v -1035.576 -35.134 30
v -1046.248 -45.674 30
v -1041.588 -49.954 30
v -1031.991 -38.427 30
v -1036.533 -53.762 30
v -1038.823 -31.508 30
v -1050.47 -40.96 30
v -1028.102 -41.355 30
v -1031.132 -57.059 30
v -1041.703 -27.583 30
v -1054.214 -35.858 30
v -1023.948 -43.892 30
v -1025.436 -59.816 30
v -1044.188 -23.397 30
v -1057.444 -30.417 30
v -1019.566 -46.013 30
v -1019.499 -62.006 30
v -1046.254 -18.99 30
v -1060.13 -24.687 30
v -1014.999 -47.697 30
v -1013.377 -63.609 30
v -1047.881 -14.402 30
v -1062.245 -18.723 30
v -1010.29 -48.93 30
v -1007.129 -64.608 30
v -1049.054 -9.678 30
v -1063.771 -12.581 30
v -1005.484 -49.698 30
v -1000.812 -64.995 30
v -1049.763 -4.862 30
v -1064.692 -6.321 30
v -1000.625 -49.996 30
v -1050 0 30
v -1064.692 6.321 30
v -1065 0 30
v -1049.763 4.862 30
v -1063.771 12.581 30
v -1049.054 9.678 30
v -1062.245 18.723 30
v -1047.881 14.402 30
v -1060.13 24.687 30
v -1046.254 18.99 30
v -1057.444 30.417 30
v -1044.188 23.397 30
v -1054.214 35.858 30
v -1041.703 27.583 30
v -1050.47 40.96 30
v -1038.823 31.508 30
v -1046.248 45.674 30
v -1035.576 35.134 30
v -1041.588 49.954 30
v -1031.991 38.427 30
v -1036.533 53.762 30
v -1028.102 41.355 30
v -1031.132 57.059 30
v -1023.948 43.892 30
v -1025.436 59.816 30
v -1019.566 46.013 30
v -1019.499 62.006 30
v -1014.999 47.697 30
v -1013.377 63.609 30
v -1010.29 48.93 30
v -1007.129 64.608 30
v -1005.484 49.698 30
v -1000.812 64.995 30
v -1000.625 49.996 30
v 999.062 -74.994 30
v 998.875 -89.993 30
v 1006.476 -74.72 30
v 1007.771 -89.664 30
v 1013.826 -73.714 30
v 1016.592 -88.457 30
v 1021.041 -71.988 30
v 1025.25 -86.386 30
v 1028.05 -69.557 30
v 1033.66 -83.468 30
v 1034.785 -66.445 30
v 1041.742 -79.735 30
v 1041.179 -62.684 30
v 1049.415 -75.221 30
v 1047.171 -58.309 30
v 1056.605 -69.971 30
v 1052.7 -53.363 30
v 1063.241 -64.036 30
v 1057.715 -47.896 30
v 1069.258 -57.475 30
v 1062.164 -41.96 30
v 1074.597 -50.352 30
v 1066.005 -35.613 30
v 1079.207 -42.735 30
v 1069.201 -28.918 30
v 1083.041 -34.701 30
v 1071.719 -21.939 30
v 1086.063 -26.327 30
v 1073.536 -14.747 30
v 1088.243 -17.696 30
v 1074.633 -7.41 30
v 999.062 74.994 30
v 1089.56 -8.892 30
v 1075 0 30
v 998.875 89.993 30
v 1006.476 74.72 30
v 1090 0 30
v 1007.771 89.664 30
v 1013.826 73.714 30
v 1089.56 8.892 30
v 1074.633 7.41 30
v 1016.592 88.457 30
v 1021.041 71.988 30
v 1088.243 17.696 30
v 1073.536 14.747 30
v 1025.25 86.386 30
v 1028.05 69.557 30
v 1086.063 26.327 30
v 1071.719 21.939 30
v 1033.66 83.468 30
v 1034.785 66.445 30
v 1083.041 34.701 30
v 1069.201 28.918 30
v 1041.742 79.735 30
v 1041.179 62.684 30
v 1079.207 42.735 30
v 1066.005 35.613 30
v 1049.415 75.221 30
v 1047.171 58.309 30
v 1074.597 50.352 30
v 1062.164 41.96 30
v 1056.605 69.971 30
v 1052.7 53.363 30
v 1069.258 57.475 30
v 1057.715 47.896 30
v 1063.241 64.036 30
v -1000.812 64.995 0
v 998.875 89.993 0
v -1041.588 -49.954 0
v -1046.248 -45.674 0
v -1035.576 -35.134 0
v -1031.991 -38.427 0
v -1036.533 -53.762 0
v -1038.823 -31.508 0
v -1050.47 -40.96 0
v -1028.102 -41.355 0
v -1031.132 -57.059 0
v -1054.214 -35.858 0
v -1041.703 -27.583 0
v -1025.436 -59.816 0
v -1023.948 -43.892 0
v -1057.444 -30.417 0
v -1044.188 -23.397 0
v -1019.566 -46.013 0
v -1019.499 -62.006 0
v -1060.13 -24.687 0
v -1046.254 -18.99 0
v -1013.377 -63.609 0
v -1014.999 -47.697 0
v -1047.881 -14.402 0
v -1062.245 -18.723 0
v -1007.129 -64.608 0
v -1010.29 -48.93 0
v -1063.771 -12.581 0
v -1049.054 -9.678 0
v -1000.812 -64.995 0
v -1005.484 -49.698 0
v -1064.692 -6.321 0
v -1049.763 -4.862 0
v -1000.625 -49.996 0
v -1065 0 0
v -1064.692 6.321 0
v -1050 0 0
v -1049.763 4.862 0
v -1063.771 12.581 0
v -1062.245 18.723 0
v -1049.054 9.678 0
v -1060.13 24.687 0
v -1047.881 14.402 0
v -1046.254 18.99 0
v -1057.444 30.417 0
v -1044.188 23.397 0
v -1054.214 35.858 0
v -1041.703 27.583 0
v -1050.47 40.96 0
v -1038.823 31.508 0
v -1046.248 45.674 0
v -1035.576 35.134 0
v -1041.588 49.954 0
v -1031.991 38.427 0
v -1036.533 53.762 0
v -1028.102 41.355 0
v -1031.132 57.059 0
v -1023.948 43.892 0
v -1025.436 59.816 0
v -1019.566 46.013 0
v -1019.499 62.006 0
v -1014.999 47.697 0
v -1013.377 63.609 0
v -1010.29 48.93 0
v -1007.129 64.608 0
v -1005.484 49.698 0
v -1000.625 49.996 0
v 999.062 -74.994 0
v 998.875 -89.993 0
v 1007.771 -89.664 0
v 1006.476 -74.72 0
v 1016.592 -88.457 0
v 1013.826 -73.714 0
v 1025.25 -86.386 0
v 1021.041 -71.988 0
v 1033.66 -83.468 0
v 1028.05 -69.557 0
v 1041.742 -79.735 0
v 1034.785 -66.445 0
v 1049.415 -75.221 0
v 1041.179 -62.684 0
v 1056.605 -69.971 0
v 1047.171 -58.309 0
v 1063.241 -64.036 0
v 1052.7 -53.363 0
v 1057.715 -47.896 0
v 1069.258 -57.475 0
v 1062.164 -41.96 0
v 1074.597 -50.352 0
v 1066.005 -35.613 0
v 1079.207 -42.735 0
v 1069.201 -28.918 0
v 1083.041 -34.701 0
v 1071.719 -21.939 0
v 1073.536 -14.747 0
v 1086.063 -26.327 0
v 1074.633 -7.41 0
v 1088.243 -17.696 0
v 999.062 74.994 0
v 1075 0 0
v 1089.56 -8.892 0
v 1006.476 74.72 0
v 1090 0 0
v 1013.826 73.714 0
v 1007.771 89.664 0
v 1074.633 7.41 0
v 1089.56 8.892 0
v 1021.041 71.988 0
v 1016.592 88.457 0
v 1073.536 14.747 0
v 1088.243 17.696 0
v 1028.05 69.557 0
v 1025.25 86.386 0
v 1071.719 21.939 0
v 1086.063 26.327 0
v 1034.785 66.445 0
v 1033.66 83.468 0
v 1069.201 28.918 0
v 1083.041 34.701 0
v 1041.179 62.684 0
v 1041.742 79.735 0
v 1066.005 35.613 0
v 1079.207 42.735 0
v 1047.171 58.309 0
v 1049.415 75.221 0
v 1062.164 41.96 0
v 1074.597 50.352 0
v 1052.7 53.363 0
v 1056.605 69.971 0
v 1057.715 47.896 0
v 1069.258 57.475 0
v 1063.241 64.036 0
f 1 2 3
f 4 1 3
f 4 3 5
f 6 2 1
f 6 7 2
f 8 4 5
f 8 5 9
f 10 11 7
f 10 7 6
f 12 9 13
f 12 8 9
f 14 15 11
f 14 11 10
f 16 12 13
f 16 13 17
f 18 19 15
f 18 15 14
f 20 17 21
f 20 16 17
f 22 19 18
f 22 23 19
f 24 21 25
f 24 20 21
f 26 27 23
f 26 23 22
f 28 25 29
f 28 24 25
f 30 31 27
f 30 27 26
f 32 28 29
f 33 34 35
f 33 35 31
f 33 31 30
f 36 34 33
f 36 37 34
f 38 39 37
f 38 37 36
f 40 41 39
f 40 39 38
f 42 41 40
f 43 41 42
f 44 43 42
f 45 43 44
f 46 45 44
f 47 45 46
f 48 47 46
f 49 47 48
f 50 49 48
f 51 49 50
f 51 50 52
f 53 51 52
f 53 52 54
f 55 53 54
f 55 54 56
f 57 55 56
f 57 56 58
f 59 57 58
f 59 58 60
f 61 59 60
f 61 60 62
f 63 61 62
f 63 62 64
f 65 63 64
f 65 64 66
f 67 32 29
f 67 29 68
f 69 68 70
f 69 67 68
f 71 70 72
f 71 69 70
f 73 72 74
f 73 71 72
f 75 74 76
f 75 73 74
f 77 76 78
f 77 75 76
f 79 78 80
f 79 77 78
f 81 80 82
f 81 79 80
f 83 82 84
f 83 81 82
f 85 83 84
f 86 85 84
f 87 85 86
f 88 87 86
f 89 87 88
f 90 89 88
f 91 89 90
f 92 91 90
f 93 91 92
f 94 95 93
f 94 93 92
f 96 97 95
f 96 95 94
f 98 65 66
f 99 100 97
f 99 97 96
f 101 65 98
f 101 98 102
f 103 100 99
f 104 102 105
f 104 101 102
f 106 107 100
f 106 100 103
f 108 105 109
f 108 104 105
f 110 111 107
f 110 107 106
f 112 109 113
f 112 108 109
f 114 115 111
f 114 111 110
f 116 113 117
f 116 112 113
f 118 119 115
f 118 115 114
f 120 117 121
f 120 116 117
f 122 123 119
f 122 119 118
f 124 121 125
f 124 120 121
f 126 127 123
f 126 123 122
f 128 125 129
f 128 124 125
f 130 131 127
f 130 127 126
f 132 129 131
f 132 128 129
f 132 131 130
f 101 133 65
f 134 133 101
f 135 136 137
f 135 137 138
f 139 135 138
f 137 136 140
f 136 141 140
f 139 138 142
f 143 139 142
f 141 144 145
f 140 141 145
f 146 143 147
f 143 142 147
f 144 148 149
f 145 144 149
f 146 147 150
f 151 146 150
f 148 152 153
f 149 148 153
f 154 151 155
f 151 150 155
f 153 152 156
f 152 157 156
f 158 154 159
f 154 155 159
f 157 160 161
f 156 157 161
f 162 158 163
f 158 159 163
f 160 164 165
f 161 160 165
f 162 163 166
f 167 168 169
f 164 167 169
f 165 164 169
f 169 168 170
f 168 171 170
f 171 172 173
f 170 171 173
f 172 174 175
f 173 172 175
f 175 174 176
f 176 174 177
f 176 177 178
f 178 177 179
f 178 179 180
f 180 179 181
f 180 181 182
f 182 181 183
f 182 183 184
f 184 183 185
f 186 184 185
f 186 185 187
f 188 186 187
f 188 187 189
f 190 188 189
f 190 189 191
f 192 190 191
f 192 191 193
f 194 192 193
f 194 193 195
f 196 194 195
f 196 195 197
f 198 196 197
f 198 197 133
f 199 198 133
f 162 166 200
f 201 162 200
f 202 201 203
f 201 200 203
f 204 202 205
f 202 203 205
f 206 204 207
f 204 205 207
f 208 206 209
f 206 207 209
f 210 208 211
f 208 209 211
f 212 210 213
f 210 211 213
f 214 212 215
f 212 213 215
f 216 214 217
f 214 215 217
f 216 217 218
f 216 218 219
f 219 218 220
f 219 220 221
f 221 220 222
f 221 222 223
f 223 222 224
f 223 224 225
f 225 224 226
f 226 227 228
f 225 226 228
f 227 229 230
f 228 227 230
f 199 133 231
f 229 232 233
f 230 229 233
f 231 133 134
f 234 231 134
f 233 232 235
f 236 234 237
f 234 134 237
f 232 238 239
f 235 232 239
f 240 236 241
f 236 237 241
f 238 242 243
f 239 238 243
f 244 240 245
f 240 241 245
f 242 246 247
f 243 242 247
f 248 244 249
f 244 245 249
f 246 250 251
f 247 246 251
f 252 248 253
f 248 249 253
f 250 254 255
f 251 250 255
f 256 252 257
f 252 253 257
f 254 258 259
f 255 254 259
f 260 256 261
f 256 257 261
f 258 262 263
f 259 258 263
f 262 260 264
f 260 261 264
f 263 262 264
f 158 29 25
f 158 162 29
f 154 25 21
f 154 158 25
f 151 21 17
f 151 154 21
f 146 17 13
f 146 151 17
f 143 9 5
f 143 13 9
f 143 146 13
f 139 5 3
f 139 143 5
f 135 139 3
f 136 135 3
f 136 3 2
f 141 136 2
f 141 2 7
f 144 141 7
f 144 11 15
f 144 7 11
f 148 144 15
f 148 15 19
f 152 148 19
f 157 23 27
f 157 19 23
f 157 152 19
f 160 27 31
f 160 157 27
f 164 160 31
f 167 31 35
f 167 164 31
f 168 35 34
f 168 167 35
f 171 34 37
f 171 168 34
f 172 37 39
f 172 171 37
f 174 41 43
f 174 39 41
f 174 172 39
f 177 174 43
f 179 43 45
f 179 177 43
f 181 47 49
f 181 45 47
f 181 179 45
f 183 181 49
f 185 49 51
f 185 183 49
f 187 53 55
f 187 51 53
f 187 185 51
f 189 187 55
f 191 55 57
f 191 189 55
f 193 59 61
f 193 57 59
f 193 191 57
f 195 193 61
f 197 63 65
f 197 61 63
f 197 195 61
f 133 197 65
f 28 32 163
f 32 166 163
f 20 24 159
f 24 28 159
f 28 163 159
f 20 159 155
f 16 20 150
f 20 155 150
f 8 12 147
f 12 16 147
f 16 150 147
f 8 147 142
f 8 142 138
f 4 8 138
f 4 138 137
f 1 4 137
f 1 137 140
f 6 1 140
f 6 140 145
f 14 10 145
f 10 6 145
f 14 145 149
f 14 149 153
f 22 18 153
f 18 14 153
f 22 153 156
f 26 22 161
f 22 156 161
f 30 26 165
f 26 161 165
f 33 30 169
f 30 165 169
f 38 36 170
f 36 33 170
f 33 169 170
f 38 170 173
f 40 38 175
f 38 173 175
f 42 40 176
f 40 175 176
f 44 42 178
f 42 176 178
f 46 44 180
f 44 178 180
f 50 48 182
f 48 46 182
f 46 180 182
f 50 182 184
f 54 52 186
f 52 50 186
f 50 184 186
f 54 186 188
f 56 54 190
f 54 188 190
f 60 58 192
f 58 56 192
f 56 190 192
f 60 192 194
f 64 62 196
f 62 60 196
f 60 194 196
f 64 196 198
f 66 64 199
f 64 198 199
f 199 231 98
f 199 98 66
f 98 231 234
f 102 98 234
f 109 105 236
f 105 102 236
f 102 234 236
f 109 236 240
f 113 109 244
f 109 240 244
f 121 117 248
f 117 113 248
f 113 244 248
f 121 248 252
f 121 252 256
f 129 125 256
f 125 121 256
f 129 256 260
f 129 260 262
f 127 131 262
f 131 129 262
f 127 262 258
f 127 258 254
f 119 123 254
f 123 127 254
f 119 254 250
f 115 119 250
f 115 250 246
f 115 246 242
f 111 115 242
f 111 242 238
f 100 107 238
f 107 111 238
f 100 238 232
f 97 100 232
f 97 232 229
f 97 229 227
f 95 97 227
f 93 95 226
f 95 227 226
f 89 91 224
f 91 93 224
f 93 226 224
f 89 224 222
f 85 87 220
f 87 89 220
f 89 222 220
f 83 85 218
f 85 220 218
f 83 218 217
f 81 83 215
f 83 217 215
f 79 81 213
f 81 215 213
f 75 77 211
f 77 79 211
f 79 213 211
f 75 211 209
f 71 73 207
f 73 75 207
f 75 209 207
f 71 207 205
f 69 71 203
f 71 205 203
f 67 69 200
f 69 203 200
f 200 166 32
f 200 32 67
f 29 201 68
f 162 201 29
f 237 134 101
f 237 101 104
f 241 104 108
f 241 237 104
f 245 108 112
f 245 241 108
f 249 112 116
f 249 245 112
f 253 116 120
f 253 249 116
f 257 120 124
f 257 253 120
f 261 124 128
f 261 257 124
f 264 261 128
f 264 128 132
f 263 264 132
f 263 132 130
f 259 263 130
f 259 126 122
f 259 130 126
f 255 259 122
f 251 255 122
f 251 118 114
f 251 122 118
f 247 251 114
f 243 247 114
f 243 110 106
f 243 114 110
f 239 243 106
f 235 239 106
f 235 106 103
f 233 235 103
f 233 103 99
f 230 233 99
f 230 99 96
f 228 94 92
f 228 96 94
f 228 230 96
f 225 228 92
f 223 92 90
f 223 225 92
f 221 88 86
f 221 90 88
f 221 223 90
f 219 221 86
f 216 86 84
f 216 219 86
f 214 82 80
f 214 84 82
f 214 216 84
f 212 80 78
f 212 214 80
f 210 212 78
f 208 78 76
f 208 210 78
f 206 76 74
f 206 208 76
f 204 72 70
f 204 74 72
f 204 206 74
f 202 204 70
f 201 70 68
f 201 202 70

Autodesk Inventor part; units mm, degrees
ref_plane "YZ Plane" through (0, 0, 0) normal (1, 0, 0) x (0, 1, 0)
ref_plane "XZ Plane" through (0, 0, 0) normal (0, 1, 0) x (-1, 0, 0)
ref_plane "XY Plane" through (0, 0, 0) normal (0, 0, 1) x (1, 0, 0)
sketch "Boceto1" plane through (0, 0, 0) normal (0, 0, 1) x (1, 0, 0)
  arc A0 (-1000.625, 49.9961) -> (-1000.625, -49.9961) centre (-1000, 0) ccw
  arc A1 (999.0625, -74.9941) -> (999.0625, 74.9941) centre (1000, 0) ccw
  line L0 (999.0625, 74.9941) -> (-1000.625, 49.9961)
  line L1 (-1000.625, -49.9961) -> (999.0625, -74.9941)
  line L2 (-1000.8125, 64.9949) -> (998.875, 89.993)
  arc A2 (998.875, -89.993) -> (998.875, 89.993) centre (1000, 0) ccw
  line L3 (998.875, -89.993) -> (-1000.8125, -64.9949)
  arc A3 (-1000.8125, 64.9949) -> (-1000.8125, -64.9949) centre (-1000, 0) ccw
  point P0 (0, 0)
  dimension "d0" = 2000
  dimension "d1" = 1000
  dimension "d2" = 100
  dimension "d3" = 150
  dimension "d4" = 15
extrude "Extrusión1" add sketch "Boceto1" along normal blind 30
equation "\"d1\" = 0.5 * d0"
properties part number "cadena"
